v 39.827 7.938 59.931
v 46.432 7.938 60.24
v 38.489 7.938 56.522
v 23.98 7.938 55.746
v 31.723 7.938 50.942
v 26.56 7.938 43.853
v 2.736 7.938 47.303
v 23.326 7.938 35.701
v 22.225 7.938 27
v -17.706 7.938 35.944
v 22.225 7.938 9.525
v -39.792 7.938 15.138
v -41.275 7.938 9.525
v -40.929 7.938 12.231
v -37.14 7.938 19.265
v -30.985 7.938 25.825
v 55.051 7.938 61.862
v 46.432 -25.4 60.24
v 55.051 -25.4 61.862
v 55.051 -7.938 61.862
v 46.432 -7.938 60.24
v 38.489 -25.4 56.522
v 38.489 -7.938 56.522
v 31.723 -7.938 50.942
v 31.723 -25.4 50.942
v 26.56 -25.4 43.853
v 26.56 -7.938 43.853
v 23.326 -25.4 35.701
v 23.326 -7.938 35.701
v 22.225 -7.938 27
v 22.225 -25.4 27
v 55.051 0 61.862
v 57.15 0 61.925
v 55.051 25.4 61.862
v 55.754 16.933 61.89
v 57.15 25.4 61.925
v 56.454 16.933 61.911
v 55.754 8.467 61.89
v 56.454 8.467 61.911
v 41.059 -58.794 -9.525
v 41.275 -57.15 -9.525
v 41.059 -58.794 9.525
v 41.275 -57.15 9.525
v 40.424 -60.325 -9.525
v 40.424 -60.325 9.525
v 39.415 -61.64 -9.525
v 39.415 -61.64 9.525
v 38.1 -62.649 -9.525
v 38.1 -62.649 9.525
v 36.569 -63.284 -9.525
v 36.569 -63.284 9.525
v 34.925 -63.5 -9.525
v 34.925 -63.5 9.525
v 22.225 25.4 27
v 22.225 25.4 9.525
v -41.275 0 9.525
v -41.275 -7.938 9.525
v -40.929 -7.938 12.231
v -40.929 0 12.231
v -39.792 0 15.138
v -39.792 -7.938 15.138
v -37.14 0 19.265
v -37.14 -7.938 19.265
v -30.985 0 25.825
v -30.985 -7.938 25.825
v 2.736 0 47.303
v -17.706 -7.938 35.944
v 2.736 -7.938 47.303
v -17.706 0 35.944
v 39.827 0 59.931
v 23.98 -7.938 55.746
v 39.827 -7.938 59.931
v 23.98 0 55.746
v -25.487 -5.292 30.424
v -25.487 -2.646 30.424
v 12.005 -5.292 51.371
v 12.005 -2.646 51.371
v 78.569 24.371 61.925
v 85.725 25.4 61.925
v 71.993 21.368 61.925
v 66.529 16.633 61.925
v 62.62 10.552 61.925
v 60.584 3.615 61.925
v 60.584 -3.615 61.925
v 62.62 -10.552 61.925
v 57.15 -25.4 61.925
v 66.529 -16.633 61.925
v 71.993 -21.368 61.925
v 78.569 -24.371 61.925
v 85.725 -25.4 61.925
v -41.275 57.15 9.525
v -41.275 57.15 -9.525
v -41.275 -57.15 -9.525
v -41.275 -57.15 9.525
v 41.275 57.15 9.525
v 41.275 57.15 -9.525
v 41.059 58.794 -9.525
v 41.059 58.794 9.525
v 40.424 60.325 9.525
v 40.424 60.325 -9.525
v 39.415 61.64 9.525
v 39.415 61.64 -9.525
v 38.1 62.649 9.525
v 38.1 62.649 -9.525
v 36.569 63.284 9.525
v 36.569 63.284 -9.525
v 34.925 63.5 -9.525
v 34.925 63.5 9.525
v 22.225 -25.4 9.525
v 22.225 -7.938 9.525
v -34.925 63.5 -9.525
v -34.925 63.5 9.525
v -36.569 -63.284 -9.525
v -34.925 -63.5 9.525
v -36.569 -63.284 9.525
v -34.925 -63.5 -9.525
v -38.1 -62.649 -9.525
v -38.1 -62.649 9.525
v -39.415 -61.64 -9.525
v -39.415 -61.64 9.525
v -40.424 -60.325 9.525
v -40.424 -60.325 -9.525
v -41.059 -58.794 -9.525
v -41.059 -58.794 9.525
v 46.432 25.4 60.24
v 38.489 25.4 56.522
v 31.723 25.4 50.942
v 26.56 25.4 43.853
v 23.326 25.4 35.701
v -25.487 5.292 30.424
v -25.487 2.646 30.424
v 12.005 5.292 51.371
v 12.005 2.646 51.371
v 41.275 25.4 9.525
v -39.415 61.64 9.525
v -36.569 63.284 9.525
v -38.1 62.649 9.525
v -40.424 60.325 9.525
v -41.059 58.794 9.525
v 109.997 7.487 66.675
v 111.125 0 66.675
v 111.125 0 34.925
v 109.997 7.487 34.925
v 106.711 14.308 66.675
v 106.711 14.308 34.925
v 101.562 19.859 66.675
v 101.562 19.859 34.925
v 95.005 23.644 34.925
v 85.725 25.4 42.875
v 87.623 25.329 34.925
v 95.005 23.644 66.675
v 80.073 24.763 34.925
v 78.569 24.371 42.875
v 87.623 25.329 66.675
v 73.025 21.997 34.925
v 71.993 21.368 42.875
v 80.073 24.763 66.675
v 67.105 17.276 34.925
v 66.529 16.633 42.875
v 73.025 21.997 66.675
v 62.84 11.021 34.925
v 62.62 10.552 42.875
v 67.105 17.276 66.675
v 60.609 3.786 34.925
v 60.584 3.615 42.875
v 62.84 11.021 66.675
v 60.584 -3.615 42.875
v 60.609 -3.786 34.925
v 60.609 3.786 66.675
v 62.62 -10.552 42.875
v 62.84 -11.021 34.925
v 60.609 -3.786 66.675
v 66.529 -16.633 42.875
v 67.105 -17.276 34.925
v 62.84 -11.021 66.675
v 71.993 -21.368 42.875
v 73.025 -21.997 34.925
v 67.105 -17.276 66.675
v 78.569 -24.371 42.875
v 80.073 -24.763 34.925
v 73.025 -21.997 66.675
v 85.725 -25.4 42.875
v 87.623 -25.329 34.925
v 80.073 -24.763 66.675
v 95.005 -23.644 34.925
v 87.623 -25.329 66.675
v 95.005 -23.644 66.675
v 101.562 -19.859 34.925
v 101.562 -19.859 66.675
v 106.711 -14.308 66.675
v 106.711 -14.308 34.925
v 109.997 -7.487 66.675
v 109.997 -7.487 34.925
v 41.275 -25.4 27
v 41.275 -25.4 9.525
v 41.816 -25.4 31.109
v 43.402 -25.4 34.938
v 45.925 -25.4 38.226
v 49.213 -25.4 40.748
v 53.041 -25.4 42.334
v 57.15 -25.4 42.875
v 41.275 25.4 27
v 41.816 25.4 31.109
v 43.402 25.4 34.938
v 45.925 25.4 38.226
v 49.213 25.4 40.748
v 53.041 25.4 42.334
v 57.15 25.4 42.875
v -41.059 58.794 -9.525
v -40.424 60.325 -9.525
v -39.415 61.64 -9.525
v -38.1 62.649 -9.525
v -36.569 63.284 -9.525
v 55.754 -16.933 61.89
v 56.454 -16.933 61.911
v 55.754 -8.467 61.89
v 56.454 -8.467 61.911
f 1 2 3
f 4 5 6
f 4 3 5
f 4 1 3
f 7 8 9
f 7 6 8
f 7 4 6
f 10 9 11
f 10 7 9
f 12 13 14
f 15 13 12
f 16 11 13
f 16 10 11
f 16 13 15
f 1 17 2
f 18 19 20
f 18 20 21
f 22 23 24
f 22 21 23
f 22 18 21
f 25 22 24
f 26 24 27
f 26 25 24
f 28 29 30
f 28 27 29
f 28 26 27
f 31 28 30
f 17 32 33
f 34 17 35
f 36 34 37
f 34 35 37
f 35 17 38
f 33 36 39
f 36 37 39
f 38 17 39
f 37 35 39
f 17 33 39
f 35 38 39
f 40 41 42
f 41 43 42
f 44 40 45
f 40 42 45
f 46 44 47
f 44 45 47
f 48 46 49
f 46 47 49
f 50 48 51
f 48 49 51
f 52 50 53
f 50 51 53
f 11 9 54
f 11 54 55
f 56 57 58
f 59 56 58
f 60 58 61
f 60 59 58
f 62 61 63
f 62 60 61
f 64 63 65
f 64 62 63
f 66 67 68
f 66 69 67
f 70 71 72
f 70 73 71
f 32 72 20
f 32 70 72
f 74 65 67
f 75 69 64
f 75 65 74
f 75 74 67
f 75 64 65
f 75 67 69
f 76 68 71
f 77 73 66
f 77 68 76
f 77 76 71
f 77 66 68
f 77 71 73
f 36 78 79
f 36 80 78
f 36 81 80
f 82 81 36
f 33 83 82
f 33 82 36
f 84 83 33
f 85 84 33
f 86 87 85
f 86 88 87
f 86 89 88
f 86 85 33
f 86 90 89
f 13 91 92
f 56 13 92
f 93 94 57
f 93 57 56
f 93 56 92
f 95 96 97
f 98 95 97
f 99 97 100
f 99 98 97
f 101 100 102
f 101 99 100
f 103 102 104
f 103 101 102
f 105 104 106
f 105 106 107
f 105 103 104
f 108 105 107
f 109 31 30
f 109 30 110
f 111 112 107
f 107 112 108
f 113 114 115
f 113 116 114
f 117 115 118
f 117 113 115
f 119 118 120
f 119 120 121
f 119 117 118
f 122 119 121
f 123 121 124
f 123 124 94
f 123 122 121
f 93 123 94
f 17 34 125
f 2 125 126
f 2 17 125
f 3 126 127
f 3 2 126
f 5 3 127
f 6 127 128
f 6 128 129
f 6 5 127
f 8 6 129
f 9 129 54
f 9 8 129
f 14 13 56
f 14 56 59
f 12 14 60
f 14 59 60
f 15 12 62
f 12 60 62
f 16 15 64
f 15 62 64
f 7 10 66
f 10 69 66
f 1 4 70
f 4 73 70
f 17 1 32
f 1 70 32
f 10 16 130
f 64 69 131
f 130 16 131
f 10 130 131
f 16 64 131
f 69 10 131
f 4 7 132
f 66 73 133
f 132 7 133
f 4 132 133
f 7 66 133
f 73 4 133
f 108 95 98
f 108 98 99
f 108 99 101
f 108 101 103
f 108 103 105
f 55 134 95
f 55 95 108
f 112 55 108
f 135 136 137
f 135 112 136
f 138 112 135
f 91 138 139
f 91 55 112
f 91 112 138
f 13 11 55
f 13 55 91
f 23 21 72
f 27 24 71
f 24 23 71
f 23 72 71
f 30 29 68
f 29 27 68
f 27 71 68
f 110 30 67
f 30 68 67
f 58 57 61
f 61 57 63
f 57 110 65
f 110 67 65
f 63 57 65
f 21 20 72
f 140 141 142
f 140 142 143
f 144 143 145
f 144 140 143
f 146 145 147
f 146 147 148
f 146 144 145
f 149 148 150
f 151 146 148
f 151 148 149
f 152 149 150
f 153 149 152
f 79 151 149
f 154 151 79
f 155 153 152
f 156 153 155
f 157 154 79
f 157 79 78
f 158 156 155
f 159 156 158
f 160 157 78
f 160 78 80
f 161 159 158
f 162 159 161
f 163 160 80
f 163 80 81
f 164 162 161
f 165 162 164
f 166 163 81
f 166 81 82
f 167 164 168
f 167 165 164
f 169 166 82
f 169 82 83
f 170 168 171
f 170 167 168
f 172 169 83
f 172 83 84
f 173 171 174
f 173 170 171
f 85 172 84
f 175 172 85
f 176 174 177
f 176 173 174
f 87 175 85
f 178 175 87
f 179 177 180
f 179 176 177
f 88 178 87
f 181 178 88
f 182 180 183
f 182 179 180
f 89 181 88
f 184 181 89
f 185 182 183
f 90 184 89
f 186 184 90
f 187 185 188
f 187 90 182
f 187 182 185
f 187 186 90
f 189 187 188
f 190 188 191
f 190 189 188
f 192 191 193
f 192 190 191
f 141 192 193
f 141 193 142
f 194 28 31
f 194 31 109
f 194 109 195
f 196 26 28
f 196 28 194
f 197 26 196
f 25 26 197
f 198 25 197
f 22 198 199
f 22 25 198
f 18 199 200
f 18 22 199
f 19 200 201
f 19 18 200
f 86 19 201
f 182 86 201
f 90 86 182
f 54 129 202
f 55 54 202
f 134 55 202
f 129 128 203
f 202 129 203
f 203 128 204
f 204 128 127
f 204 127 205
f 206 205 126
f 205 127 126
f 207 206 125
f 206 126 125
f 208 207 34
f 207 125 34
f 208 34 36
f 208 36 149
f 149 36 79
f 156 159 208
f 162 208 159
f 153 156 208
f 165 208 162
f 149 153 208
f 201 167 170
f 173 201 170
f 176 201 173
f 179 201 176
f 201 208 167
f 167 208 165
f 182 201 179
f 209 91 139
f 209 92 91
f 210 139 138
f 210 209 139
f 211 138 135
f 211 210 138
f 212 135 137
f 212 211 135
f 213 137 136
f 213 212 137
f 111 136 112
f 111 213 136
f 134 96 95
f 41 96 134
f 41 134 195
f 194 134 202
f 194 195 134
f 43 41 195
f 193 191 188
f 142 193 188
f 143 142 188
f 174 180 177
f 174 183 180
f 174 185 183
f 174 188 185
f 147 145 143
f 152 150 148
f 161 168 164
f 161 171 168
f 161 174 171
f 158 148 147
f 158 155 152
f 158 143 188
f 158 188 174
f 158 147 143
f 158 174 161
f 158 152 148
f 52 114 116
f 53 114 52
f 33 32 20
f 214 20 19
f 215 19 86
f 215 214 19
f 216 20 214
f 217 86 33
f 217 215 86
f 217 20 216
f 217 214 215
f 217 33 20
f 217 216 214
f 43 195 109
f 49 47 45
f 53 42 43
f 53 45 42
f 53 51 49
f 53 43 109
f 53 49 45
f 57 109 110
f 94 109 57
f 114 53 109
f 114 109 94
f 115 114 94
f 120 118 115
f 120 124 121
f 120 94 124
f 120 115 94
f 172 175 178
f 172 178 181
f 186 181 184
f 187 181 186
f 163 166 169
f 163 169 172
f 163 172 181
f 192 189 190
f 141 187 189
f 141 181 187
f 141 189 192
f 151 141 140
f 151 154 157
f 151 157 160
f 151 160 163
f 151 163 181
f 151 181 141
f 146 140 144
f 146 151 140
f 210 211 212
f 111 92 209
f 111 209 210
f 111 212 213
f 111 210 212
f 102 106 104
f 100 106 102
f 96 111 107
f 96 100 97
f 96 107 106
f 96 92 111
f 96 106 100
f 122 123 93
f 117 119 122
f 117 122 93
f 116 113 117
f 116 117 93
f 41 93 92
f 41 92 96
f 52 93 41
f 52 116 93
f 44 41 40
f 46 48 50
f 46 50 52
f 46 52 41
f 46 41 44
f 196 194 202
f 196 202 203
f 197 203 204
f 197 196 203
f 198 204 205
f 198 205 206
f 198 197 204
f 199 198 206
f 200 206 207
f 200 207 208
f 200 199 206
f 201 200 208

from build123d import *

# Parameters (mm, degrees)
F1_DEPTH = 63.5
F0_W     = 25.4
F0_H     = 19.05
F2_DEPTH = 25.4
F3_DEPTH = 7.9375
F5_R     = 6.35


with BuildPart() as f1:
    # F0 (on Front) → F1 (new body, symmetric)
    with BuildSketch(Plane.XZ):
        Polygon((22.225, 9.525), (-41.275, 9.525), (-41.275, -9.525), (41.275, -9.525), (41.275, 9.525), align=None)
    extrude(amount=F1_DEPTH, both=True)

    # F0 (on Front) → F2 (join, symmetric)
    with BuildSketch(Plane.XZ):
        with BuildLine():
            Line((22.225, 27.0002), (22.225, 9.525))
            Line((22.225, 9.525), (41.275, 9.525))
            Line((41.275, 9.525), (41.275, 27.0002))
            ThreePointArc((41.275, 27.0002), (45.9246798487, 38.2255201513), (57.15, 42.8752))
            Line((57.15, 42.8752), (60.325, 42.8752))
            Line((60.325, 42.8752), (60.325, 61.9252))
            Line((60.325, 61.9252), (57.15, 61.9252))
            add(Edge.make_bspline(
                [(55.0505614157, 61.8620413546), (55.7553301677, 61.8927275326), (56.4552712622, 61.9138638229), (57.15, 61.9252)],
                knots=[109.5945481274, 109.5945481274, 109.5945481274, 109.5945481274, 111.5045361635, 111.5045361635, 111.5045361635, 111.5045361635], degree=3))
            ThreePointArc((55.0505614157, 61.8620413546), (31.7228637323, 50.9421373949), (22.225, 27.0002))
        make_face()
        with Locations((73.025, 52.4002)):
            Rectangle(F0_W, F0_H)
    extrude(amount=F2_DEPTH, both=True)

    # F0 (on Front) → F3 (join, symmetric)
    with BuildSketch(Plane.XZ):
        with BuildLine():
            add(Edge.make_bspline(
                [(-41.275, 9.525), (-41.7230096013, 26.8981728719), (14.611139049, 60.1012775438), (55.0505614157, 61.8620413546)],
                knots=[0, 0, 0, 0, 109.5945481274, 109.5945481274, 109.5945481274, 109.5945481274], degree=3))
            Line((-41.275, 9.525), (22.225, 9.525))
            Line((22.225, 9.525), (22.225, 27.0002))
            ThreePointArc((22.225, 27.0002), (31.7228637323, 50.9421373949), (55.0505614157, 61.8620413546))
        make_face()
    extrude(amount=F3_DEPTH, both=True)

    # F0 (on Front) → F4 (revolve)
    with BuildSketch(Plane.XZ):
        Polygon((85.725, 66.675), (85.725, 61.9252), (85.725, 42.8752), (85.725, 34.925), (111.125, 34.925), (111.125, 66.675), align=None)
    revolve(axis=Axis((85.725, 0, 50.8), (0, 0, 1)))

    # F5
    f5_edges = [f1.edges().sort_by_distance(p)[0] for p in [
        (-41.275, -63.5, 0),
        (41.275, -63.5, 0),
        (41.275, 63.5, 0),
        (-41.275, 63.5, 0),
    ]]
    fillet(f5_edges, radius=F5_R)


solid = f1.part
